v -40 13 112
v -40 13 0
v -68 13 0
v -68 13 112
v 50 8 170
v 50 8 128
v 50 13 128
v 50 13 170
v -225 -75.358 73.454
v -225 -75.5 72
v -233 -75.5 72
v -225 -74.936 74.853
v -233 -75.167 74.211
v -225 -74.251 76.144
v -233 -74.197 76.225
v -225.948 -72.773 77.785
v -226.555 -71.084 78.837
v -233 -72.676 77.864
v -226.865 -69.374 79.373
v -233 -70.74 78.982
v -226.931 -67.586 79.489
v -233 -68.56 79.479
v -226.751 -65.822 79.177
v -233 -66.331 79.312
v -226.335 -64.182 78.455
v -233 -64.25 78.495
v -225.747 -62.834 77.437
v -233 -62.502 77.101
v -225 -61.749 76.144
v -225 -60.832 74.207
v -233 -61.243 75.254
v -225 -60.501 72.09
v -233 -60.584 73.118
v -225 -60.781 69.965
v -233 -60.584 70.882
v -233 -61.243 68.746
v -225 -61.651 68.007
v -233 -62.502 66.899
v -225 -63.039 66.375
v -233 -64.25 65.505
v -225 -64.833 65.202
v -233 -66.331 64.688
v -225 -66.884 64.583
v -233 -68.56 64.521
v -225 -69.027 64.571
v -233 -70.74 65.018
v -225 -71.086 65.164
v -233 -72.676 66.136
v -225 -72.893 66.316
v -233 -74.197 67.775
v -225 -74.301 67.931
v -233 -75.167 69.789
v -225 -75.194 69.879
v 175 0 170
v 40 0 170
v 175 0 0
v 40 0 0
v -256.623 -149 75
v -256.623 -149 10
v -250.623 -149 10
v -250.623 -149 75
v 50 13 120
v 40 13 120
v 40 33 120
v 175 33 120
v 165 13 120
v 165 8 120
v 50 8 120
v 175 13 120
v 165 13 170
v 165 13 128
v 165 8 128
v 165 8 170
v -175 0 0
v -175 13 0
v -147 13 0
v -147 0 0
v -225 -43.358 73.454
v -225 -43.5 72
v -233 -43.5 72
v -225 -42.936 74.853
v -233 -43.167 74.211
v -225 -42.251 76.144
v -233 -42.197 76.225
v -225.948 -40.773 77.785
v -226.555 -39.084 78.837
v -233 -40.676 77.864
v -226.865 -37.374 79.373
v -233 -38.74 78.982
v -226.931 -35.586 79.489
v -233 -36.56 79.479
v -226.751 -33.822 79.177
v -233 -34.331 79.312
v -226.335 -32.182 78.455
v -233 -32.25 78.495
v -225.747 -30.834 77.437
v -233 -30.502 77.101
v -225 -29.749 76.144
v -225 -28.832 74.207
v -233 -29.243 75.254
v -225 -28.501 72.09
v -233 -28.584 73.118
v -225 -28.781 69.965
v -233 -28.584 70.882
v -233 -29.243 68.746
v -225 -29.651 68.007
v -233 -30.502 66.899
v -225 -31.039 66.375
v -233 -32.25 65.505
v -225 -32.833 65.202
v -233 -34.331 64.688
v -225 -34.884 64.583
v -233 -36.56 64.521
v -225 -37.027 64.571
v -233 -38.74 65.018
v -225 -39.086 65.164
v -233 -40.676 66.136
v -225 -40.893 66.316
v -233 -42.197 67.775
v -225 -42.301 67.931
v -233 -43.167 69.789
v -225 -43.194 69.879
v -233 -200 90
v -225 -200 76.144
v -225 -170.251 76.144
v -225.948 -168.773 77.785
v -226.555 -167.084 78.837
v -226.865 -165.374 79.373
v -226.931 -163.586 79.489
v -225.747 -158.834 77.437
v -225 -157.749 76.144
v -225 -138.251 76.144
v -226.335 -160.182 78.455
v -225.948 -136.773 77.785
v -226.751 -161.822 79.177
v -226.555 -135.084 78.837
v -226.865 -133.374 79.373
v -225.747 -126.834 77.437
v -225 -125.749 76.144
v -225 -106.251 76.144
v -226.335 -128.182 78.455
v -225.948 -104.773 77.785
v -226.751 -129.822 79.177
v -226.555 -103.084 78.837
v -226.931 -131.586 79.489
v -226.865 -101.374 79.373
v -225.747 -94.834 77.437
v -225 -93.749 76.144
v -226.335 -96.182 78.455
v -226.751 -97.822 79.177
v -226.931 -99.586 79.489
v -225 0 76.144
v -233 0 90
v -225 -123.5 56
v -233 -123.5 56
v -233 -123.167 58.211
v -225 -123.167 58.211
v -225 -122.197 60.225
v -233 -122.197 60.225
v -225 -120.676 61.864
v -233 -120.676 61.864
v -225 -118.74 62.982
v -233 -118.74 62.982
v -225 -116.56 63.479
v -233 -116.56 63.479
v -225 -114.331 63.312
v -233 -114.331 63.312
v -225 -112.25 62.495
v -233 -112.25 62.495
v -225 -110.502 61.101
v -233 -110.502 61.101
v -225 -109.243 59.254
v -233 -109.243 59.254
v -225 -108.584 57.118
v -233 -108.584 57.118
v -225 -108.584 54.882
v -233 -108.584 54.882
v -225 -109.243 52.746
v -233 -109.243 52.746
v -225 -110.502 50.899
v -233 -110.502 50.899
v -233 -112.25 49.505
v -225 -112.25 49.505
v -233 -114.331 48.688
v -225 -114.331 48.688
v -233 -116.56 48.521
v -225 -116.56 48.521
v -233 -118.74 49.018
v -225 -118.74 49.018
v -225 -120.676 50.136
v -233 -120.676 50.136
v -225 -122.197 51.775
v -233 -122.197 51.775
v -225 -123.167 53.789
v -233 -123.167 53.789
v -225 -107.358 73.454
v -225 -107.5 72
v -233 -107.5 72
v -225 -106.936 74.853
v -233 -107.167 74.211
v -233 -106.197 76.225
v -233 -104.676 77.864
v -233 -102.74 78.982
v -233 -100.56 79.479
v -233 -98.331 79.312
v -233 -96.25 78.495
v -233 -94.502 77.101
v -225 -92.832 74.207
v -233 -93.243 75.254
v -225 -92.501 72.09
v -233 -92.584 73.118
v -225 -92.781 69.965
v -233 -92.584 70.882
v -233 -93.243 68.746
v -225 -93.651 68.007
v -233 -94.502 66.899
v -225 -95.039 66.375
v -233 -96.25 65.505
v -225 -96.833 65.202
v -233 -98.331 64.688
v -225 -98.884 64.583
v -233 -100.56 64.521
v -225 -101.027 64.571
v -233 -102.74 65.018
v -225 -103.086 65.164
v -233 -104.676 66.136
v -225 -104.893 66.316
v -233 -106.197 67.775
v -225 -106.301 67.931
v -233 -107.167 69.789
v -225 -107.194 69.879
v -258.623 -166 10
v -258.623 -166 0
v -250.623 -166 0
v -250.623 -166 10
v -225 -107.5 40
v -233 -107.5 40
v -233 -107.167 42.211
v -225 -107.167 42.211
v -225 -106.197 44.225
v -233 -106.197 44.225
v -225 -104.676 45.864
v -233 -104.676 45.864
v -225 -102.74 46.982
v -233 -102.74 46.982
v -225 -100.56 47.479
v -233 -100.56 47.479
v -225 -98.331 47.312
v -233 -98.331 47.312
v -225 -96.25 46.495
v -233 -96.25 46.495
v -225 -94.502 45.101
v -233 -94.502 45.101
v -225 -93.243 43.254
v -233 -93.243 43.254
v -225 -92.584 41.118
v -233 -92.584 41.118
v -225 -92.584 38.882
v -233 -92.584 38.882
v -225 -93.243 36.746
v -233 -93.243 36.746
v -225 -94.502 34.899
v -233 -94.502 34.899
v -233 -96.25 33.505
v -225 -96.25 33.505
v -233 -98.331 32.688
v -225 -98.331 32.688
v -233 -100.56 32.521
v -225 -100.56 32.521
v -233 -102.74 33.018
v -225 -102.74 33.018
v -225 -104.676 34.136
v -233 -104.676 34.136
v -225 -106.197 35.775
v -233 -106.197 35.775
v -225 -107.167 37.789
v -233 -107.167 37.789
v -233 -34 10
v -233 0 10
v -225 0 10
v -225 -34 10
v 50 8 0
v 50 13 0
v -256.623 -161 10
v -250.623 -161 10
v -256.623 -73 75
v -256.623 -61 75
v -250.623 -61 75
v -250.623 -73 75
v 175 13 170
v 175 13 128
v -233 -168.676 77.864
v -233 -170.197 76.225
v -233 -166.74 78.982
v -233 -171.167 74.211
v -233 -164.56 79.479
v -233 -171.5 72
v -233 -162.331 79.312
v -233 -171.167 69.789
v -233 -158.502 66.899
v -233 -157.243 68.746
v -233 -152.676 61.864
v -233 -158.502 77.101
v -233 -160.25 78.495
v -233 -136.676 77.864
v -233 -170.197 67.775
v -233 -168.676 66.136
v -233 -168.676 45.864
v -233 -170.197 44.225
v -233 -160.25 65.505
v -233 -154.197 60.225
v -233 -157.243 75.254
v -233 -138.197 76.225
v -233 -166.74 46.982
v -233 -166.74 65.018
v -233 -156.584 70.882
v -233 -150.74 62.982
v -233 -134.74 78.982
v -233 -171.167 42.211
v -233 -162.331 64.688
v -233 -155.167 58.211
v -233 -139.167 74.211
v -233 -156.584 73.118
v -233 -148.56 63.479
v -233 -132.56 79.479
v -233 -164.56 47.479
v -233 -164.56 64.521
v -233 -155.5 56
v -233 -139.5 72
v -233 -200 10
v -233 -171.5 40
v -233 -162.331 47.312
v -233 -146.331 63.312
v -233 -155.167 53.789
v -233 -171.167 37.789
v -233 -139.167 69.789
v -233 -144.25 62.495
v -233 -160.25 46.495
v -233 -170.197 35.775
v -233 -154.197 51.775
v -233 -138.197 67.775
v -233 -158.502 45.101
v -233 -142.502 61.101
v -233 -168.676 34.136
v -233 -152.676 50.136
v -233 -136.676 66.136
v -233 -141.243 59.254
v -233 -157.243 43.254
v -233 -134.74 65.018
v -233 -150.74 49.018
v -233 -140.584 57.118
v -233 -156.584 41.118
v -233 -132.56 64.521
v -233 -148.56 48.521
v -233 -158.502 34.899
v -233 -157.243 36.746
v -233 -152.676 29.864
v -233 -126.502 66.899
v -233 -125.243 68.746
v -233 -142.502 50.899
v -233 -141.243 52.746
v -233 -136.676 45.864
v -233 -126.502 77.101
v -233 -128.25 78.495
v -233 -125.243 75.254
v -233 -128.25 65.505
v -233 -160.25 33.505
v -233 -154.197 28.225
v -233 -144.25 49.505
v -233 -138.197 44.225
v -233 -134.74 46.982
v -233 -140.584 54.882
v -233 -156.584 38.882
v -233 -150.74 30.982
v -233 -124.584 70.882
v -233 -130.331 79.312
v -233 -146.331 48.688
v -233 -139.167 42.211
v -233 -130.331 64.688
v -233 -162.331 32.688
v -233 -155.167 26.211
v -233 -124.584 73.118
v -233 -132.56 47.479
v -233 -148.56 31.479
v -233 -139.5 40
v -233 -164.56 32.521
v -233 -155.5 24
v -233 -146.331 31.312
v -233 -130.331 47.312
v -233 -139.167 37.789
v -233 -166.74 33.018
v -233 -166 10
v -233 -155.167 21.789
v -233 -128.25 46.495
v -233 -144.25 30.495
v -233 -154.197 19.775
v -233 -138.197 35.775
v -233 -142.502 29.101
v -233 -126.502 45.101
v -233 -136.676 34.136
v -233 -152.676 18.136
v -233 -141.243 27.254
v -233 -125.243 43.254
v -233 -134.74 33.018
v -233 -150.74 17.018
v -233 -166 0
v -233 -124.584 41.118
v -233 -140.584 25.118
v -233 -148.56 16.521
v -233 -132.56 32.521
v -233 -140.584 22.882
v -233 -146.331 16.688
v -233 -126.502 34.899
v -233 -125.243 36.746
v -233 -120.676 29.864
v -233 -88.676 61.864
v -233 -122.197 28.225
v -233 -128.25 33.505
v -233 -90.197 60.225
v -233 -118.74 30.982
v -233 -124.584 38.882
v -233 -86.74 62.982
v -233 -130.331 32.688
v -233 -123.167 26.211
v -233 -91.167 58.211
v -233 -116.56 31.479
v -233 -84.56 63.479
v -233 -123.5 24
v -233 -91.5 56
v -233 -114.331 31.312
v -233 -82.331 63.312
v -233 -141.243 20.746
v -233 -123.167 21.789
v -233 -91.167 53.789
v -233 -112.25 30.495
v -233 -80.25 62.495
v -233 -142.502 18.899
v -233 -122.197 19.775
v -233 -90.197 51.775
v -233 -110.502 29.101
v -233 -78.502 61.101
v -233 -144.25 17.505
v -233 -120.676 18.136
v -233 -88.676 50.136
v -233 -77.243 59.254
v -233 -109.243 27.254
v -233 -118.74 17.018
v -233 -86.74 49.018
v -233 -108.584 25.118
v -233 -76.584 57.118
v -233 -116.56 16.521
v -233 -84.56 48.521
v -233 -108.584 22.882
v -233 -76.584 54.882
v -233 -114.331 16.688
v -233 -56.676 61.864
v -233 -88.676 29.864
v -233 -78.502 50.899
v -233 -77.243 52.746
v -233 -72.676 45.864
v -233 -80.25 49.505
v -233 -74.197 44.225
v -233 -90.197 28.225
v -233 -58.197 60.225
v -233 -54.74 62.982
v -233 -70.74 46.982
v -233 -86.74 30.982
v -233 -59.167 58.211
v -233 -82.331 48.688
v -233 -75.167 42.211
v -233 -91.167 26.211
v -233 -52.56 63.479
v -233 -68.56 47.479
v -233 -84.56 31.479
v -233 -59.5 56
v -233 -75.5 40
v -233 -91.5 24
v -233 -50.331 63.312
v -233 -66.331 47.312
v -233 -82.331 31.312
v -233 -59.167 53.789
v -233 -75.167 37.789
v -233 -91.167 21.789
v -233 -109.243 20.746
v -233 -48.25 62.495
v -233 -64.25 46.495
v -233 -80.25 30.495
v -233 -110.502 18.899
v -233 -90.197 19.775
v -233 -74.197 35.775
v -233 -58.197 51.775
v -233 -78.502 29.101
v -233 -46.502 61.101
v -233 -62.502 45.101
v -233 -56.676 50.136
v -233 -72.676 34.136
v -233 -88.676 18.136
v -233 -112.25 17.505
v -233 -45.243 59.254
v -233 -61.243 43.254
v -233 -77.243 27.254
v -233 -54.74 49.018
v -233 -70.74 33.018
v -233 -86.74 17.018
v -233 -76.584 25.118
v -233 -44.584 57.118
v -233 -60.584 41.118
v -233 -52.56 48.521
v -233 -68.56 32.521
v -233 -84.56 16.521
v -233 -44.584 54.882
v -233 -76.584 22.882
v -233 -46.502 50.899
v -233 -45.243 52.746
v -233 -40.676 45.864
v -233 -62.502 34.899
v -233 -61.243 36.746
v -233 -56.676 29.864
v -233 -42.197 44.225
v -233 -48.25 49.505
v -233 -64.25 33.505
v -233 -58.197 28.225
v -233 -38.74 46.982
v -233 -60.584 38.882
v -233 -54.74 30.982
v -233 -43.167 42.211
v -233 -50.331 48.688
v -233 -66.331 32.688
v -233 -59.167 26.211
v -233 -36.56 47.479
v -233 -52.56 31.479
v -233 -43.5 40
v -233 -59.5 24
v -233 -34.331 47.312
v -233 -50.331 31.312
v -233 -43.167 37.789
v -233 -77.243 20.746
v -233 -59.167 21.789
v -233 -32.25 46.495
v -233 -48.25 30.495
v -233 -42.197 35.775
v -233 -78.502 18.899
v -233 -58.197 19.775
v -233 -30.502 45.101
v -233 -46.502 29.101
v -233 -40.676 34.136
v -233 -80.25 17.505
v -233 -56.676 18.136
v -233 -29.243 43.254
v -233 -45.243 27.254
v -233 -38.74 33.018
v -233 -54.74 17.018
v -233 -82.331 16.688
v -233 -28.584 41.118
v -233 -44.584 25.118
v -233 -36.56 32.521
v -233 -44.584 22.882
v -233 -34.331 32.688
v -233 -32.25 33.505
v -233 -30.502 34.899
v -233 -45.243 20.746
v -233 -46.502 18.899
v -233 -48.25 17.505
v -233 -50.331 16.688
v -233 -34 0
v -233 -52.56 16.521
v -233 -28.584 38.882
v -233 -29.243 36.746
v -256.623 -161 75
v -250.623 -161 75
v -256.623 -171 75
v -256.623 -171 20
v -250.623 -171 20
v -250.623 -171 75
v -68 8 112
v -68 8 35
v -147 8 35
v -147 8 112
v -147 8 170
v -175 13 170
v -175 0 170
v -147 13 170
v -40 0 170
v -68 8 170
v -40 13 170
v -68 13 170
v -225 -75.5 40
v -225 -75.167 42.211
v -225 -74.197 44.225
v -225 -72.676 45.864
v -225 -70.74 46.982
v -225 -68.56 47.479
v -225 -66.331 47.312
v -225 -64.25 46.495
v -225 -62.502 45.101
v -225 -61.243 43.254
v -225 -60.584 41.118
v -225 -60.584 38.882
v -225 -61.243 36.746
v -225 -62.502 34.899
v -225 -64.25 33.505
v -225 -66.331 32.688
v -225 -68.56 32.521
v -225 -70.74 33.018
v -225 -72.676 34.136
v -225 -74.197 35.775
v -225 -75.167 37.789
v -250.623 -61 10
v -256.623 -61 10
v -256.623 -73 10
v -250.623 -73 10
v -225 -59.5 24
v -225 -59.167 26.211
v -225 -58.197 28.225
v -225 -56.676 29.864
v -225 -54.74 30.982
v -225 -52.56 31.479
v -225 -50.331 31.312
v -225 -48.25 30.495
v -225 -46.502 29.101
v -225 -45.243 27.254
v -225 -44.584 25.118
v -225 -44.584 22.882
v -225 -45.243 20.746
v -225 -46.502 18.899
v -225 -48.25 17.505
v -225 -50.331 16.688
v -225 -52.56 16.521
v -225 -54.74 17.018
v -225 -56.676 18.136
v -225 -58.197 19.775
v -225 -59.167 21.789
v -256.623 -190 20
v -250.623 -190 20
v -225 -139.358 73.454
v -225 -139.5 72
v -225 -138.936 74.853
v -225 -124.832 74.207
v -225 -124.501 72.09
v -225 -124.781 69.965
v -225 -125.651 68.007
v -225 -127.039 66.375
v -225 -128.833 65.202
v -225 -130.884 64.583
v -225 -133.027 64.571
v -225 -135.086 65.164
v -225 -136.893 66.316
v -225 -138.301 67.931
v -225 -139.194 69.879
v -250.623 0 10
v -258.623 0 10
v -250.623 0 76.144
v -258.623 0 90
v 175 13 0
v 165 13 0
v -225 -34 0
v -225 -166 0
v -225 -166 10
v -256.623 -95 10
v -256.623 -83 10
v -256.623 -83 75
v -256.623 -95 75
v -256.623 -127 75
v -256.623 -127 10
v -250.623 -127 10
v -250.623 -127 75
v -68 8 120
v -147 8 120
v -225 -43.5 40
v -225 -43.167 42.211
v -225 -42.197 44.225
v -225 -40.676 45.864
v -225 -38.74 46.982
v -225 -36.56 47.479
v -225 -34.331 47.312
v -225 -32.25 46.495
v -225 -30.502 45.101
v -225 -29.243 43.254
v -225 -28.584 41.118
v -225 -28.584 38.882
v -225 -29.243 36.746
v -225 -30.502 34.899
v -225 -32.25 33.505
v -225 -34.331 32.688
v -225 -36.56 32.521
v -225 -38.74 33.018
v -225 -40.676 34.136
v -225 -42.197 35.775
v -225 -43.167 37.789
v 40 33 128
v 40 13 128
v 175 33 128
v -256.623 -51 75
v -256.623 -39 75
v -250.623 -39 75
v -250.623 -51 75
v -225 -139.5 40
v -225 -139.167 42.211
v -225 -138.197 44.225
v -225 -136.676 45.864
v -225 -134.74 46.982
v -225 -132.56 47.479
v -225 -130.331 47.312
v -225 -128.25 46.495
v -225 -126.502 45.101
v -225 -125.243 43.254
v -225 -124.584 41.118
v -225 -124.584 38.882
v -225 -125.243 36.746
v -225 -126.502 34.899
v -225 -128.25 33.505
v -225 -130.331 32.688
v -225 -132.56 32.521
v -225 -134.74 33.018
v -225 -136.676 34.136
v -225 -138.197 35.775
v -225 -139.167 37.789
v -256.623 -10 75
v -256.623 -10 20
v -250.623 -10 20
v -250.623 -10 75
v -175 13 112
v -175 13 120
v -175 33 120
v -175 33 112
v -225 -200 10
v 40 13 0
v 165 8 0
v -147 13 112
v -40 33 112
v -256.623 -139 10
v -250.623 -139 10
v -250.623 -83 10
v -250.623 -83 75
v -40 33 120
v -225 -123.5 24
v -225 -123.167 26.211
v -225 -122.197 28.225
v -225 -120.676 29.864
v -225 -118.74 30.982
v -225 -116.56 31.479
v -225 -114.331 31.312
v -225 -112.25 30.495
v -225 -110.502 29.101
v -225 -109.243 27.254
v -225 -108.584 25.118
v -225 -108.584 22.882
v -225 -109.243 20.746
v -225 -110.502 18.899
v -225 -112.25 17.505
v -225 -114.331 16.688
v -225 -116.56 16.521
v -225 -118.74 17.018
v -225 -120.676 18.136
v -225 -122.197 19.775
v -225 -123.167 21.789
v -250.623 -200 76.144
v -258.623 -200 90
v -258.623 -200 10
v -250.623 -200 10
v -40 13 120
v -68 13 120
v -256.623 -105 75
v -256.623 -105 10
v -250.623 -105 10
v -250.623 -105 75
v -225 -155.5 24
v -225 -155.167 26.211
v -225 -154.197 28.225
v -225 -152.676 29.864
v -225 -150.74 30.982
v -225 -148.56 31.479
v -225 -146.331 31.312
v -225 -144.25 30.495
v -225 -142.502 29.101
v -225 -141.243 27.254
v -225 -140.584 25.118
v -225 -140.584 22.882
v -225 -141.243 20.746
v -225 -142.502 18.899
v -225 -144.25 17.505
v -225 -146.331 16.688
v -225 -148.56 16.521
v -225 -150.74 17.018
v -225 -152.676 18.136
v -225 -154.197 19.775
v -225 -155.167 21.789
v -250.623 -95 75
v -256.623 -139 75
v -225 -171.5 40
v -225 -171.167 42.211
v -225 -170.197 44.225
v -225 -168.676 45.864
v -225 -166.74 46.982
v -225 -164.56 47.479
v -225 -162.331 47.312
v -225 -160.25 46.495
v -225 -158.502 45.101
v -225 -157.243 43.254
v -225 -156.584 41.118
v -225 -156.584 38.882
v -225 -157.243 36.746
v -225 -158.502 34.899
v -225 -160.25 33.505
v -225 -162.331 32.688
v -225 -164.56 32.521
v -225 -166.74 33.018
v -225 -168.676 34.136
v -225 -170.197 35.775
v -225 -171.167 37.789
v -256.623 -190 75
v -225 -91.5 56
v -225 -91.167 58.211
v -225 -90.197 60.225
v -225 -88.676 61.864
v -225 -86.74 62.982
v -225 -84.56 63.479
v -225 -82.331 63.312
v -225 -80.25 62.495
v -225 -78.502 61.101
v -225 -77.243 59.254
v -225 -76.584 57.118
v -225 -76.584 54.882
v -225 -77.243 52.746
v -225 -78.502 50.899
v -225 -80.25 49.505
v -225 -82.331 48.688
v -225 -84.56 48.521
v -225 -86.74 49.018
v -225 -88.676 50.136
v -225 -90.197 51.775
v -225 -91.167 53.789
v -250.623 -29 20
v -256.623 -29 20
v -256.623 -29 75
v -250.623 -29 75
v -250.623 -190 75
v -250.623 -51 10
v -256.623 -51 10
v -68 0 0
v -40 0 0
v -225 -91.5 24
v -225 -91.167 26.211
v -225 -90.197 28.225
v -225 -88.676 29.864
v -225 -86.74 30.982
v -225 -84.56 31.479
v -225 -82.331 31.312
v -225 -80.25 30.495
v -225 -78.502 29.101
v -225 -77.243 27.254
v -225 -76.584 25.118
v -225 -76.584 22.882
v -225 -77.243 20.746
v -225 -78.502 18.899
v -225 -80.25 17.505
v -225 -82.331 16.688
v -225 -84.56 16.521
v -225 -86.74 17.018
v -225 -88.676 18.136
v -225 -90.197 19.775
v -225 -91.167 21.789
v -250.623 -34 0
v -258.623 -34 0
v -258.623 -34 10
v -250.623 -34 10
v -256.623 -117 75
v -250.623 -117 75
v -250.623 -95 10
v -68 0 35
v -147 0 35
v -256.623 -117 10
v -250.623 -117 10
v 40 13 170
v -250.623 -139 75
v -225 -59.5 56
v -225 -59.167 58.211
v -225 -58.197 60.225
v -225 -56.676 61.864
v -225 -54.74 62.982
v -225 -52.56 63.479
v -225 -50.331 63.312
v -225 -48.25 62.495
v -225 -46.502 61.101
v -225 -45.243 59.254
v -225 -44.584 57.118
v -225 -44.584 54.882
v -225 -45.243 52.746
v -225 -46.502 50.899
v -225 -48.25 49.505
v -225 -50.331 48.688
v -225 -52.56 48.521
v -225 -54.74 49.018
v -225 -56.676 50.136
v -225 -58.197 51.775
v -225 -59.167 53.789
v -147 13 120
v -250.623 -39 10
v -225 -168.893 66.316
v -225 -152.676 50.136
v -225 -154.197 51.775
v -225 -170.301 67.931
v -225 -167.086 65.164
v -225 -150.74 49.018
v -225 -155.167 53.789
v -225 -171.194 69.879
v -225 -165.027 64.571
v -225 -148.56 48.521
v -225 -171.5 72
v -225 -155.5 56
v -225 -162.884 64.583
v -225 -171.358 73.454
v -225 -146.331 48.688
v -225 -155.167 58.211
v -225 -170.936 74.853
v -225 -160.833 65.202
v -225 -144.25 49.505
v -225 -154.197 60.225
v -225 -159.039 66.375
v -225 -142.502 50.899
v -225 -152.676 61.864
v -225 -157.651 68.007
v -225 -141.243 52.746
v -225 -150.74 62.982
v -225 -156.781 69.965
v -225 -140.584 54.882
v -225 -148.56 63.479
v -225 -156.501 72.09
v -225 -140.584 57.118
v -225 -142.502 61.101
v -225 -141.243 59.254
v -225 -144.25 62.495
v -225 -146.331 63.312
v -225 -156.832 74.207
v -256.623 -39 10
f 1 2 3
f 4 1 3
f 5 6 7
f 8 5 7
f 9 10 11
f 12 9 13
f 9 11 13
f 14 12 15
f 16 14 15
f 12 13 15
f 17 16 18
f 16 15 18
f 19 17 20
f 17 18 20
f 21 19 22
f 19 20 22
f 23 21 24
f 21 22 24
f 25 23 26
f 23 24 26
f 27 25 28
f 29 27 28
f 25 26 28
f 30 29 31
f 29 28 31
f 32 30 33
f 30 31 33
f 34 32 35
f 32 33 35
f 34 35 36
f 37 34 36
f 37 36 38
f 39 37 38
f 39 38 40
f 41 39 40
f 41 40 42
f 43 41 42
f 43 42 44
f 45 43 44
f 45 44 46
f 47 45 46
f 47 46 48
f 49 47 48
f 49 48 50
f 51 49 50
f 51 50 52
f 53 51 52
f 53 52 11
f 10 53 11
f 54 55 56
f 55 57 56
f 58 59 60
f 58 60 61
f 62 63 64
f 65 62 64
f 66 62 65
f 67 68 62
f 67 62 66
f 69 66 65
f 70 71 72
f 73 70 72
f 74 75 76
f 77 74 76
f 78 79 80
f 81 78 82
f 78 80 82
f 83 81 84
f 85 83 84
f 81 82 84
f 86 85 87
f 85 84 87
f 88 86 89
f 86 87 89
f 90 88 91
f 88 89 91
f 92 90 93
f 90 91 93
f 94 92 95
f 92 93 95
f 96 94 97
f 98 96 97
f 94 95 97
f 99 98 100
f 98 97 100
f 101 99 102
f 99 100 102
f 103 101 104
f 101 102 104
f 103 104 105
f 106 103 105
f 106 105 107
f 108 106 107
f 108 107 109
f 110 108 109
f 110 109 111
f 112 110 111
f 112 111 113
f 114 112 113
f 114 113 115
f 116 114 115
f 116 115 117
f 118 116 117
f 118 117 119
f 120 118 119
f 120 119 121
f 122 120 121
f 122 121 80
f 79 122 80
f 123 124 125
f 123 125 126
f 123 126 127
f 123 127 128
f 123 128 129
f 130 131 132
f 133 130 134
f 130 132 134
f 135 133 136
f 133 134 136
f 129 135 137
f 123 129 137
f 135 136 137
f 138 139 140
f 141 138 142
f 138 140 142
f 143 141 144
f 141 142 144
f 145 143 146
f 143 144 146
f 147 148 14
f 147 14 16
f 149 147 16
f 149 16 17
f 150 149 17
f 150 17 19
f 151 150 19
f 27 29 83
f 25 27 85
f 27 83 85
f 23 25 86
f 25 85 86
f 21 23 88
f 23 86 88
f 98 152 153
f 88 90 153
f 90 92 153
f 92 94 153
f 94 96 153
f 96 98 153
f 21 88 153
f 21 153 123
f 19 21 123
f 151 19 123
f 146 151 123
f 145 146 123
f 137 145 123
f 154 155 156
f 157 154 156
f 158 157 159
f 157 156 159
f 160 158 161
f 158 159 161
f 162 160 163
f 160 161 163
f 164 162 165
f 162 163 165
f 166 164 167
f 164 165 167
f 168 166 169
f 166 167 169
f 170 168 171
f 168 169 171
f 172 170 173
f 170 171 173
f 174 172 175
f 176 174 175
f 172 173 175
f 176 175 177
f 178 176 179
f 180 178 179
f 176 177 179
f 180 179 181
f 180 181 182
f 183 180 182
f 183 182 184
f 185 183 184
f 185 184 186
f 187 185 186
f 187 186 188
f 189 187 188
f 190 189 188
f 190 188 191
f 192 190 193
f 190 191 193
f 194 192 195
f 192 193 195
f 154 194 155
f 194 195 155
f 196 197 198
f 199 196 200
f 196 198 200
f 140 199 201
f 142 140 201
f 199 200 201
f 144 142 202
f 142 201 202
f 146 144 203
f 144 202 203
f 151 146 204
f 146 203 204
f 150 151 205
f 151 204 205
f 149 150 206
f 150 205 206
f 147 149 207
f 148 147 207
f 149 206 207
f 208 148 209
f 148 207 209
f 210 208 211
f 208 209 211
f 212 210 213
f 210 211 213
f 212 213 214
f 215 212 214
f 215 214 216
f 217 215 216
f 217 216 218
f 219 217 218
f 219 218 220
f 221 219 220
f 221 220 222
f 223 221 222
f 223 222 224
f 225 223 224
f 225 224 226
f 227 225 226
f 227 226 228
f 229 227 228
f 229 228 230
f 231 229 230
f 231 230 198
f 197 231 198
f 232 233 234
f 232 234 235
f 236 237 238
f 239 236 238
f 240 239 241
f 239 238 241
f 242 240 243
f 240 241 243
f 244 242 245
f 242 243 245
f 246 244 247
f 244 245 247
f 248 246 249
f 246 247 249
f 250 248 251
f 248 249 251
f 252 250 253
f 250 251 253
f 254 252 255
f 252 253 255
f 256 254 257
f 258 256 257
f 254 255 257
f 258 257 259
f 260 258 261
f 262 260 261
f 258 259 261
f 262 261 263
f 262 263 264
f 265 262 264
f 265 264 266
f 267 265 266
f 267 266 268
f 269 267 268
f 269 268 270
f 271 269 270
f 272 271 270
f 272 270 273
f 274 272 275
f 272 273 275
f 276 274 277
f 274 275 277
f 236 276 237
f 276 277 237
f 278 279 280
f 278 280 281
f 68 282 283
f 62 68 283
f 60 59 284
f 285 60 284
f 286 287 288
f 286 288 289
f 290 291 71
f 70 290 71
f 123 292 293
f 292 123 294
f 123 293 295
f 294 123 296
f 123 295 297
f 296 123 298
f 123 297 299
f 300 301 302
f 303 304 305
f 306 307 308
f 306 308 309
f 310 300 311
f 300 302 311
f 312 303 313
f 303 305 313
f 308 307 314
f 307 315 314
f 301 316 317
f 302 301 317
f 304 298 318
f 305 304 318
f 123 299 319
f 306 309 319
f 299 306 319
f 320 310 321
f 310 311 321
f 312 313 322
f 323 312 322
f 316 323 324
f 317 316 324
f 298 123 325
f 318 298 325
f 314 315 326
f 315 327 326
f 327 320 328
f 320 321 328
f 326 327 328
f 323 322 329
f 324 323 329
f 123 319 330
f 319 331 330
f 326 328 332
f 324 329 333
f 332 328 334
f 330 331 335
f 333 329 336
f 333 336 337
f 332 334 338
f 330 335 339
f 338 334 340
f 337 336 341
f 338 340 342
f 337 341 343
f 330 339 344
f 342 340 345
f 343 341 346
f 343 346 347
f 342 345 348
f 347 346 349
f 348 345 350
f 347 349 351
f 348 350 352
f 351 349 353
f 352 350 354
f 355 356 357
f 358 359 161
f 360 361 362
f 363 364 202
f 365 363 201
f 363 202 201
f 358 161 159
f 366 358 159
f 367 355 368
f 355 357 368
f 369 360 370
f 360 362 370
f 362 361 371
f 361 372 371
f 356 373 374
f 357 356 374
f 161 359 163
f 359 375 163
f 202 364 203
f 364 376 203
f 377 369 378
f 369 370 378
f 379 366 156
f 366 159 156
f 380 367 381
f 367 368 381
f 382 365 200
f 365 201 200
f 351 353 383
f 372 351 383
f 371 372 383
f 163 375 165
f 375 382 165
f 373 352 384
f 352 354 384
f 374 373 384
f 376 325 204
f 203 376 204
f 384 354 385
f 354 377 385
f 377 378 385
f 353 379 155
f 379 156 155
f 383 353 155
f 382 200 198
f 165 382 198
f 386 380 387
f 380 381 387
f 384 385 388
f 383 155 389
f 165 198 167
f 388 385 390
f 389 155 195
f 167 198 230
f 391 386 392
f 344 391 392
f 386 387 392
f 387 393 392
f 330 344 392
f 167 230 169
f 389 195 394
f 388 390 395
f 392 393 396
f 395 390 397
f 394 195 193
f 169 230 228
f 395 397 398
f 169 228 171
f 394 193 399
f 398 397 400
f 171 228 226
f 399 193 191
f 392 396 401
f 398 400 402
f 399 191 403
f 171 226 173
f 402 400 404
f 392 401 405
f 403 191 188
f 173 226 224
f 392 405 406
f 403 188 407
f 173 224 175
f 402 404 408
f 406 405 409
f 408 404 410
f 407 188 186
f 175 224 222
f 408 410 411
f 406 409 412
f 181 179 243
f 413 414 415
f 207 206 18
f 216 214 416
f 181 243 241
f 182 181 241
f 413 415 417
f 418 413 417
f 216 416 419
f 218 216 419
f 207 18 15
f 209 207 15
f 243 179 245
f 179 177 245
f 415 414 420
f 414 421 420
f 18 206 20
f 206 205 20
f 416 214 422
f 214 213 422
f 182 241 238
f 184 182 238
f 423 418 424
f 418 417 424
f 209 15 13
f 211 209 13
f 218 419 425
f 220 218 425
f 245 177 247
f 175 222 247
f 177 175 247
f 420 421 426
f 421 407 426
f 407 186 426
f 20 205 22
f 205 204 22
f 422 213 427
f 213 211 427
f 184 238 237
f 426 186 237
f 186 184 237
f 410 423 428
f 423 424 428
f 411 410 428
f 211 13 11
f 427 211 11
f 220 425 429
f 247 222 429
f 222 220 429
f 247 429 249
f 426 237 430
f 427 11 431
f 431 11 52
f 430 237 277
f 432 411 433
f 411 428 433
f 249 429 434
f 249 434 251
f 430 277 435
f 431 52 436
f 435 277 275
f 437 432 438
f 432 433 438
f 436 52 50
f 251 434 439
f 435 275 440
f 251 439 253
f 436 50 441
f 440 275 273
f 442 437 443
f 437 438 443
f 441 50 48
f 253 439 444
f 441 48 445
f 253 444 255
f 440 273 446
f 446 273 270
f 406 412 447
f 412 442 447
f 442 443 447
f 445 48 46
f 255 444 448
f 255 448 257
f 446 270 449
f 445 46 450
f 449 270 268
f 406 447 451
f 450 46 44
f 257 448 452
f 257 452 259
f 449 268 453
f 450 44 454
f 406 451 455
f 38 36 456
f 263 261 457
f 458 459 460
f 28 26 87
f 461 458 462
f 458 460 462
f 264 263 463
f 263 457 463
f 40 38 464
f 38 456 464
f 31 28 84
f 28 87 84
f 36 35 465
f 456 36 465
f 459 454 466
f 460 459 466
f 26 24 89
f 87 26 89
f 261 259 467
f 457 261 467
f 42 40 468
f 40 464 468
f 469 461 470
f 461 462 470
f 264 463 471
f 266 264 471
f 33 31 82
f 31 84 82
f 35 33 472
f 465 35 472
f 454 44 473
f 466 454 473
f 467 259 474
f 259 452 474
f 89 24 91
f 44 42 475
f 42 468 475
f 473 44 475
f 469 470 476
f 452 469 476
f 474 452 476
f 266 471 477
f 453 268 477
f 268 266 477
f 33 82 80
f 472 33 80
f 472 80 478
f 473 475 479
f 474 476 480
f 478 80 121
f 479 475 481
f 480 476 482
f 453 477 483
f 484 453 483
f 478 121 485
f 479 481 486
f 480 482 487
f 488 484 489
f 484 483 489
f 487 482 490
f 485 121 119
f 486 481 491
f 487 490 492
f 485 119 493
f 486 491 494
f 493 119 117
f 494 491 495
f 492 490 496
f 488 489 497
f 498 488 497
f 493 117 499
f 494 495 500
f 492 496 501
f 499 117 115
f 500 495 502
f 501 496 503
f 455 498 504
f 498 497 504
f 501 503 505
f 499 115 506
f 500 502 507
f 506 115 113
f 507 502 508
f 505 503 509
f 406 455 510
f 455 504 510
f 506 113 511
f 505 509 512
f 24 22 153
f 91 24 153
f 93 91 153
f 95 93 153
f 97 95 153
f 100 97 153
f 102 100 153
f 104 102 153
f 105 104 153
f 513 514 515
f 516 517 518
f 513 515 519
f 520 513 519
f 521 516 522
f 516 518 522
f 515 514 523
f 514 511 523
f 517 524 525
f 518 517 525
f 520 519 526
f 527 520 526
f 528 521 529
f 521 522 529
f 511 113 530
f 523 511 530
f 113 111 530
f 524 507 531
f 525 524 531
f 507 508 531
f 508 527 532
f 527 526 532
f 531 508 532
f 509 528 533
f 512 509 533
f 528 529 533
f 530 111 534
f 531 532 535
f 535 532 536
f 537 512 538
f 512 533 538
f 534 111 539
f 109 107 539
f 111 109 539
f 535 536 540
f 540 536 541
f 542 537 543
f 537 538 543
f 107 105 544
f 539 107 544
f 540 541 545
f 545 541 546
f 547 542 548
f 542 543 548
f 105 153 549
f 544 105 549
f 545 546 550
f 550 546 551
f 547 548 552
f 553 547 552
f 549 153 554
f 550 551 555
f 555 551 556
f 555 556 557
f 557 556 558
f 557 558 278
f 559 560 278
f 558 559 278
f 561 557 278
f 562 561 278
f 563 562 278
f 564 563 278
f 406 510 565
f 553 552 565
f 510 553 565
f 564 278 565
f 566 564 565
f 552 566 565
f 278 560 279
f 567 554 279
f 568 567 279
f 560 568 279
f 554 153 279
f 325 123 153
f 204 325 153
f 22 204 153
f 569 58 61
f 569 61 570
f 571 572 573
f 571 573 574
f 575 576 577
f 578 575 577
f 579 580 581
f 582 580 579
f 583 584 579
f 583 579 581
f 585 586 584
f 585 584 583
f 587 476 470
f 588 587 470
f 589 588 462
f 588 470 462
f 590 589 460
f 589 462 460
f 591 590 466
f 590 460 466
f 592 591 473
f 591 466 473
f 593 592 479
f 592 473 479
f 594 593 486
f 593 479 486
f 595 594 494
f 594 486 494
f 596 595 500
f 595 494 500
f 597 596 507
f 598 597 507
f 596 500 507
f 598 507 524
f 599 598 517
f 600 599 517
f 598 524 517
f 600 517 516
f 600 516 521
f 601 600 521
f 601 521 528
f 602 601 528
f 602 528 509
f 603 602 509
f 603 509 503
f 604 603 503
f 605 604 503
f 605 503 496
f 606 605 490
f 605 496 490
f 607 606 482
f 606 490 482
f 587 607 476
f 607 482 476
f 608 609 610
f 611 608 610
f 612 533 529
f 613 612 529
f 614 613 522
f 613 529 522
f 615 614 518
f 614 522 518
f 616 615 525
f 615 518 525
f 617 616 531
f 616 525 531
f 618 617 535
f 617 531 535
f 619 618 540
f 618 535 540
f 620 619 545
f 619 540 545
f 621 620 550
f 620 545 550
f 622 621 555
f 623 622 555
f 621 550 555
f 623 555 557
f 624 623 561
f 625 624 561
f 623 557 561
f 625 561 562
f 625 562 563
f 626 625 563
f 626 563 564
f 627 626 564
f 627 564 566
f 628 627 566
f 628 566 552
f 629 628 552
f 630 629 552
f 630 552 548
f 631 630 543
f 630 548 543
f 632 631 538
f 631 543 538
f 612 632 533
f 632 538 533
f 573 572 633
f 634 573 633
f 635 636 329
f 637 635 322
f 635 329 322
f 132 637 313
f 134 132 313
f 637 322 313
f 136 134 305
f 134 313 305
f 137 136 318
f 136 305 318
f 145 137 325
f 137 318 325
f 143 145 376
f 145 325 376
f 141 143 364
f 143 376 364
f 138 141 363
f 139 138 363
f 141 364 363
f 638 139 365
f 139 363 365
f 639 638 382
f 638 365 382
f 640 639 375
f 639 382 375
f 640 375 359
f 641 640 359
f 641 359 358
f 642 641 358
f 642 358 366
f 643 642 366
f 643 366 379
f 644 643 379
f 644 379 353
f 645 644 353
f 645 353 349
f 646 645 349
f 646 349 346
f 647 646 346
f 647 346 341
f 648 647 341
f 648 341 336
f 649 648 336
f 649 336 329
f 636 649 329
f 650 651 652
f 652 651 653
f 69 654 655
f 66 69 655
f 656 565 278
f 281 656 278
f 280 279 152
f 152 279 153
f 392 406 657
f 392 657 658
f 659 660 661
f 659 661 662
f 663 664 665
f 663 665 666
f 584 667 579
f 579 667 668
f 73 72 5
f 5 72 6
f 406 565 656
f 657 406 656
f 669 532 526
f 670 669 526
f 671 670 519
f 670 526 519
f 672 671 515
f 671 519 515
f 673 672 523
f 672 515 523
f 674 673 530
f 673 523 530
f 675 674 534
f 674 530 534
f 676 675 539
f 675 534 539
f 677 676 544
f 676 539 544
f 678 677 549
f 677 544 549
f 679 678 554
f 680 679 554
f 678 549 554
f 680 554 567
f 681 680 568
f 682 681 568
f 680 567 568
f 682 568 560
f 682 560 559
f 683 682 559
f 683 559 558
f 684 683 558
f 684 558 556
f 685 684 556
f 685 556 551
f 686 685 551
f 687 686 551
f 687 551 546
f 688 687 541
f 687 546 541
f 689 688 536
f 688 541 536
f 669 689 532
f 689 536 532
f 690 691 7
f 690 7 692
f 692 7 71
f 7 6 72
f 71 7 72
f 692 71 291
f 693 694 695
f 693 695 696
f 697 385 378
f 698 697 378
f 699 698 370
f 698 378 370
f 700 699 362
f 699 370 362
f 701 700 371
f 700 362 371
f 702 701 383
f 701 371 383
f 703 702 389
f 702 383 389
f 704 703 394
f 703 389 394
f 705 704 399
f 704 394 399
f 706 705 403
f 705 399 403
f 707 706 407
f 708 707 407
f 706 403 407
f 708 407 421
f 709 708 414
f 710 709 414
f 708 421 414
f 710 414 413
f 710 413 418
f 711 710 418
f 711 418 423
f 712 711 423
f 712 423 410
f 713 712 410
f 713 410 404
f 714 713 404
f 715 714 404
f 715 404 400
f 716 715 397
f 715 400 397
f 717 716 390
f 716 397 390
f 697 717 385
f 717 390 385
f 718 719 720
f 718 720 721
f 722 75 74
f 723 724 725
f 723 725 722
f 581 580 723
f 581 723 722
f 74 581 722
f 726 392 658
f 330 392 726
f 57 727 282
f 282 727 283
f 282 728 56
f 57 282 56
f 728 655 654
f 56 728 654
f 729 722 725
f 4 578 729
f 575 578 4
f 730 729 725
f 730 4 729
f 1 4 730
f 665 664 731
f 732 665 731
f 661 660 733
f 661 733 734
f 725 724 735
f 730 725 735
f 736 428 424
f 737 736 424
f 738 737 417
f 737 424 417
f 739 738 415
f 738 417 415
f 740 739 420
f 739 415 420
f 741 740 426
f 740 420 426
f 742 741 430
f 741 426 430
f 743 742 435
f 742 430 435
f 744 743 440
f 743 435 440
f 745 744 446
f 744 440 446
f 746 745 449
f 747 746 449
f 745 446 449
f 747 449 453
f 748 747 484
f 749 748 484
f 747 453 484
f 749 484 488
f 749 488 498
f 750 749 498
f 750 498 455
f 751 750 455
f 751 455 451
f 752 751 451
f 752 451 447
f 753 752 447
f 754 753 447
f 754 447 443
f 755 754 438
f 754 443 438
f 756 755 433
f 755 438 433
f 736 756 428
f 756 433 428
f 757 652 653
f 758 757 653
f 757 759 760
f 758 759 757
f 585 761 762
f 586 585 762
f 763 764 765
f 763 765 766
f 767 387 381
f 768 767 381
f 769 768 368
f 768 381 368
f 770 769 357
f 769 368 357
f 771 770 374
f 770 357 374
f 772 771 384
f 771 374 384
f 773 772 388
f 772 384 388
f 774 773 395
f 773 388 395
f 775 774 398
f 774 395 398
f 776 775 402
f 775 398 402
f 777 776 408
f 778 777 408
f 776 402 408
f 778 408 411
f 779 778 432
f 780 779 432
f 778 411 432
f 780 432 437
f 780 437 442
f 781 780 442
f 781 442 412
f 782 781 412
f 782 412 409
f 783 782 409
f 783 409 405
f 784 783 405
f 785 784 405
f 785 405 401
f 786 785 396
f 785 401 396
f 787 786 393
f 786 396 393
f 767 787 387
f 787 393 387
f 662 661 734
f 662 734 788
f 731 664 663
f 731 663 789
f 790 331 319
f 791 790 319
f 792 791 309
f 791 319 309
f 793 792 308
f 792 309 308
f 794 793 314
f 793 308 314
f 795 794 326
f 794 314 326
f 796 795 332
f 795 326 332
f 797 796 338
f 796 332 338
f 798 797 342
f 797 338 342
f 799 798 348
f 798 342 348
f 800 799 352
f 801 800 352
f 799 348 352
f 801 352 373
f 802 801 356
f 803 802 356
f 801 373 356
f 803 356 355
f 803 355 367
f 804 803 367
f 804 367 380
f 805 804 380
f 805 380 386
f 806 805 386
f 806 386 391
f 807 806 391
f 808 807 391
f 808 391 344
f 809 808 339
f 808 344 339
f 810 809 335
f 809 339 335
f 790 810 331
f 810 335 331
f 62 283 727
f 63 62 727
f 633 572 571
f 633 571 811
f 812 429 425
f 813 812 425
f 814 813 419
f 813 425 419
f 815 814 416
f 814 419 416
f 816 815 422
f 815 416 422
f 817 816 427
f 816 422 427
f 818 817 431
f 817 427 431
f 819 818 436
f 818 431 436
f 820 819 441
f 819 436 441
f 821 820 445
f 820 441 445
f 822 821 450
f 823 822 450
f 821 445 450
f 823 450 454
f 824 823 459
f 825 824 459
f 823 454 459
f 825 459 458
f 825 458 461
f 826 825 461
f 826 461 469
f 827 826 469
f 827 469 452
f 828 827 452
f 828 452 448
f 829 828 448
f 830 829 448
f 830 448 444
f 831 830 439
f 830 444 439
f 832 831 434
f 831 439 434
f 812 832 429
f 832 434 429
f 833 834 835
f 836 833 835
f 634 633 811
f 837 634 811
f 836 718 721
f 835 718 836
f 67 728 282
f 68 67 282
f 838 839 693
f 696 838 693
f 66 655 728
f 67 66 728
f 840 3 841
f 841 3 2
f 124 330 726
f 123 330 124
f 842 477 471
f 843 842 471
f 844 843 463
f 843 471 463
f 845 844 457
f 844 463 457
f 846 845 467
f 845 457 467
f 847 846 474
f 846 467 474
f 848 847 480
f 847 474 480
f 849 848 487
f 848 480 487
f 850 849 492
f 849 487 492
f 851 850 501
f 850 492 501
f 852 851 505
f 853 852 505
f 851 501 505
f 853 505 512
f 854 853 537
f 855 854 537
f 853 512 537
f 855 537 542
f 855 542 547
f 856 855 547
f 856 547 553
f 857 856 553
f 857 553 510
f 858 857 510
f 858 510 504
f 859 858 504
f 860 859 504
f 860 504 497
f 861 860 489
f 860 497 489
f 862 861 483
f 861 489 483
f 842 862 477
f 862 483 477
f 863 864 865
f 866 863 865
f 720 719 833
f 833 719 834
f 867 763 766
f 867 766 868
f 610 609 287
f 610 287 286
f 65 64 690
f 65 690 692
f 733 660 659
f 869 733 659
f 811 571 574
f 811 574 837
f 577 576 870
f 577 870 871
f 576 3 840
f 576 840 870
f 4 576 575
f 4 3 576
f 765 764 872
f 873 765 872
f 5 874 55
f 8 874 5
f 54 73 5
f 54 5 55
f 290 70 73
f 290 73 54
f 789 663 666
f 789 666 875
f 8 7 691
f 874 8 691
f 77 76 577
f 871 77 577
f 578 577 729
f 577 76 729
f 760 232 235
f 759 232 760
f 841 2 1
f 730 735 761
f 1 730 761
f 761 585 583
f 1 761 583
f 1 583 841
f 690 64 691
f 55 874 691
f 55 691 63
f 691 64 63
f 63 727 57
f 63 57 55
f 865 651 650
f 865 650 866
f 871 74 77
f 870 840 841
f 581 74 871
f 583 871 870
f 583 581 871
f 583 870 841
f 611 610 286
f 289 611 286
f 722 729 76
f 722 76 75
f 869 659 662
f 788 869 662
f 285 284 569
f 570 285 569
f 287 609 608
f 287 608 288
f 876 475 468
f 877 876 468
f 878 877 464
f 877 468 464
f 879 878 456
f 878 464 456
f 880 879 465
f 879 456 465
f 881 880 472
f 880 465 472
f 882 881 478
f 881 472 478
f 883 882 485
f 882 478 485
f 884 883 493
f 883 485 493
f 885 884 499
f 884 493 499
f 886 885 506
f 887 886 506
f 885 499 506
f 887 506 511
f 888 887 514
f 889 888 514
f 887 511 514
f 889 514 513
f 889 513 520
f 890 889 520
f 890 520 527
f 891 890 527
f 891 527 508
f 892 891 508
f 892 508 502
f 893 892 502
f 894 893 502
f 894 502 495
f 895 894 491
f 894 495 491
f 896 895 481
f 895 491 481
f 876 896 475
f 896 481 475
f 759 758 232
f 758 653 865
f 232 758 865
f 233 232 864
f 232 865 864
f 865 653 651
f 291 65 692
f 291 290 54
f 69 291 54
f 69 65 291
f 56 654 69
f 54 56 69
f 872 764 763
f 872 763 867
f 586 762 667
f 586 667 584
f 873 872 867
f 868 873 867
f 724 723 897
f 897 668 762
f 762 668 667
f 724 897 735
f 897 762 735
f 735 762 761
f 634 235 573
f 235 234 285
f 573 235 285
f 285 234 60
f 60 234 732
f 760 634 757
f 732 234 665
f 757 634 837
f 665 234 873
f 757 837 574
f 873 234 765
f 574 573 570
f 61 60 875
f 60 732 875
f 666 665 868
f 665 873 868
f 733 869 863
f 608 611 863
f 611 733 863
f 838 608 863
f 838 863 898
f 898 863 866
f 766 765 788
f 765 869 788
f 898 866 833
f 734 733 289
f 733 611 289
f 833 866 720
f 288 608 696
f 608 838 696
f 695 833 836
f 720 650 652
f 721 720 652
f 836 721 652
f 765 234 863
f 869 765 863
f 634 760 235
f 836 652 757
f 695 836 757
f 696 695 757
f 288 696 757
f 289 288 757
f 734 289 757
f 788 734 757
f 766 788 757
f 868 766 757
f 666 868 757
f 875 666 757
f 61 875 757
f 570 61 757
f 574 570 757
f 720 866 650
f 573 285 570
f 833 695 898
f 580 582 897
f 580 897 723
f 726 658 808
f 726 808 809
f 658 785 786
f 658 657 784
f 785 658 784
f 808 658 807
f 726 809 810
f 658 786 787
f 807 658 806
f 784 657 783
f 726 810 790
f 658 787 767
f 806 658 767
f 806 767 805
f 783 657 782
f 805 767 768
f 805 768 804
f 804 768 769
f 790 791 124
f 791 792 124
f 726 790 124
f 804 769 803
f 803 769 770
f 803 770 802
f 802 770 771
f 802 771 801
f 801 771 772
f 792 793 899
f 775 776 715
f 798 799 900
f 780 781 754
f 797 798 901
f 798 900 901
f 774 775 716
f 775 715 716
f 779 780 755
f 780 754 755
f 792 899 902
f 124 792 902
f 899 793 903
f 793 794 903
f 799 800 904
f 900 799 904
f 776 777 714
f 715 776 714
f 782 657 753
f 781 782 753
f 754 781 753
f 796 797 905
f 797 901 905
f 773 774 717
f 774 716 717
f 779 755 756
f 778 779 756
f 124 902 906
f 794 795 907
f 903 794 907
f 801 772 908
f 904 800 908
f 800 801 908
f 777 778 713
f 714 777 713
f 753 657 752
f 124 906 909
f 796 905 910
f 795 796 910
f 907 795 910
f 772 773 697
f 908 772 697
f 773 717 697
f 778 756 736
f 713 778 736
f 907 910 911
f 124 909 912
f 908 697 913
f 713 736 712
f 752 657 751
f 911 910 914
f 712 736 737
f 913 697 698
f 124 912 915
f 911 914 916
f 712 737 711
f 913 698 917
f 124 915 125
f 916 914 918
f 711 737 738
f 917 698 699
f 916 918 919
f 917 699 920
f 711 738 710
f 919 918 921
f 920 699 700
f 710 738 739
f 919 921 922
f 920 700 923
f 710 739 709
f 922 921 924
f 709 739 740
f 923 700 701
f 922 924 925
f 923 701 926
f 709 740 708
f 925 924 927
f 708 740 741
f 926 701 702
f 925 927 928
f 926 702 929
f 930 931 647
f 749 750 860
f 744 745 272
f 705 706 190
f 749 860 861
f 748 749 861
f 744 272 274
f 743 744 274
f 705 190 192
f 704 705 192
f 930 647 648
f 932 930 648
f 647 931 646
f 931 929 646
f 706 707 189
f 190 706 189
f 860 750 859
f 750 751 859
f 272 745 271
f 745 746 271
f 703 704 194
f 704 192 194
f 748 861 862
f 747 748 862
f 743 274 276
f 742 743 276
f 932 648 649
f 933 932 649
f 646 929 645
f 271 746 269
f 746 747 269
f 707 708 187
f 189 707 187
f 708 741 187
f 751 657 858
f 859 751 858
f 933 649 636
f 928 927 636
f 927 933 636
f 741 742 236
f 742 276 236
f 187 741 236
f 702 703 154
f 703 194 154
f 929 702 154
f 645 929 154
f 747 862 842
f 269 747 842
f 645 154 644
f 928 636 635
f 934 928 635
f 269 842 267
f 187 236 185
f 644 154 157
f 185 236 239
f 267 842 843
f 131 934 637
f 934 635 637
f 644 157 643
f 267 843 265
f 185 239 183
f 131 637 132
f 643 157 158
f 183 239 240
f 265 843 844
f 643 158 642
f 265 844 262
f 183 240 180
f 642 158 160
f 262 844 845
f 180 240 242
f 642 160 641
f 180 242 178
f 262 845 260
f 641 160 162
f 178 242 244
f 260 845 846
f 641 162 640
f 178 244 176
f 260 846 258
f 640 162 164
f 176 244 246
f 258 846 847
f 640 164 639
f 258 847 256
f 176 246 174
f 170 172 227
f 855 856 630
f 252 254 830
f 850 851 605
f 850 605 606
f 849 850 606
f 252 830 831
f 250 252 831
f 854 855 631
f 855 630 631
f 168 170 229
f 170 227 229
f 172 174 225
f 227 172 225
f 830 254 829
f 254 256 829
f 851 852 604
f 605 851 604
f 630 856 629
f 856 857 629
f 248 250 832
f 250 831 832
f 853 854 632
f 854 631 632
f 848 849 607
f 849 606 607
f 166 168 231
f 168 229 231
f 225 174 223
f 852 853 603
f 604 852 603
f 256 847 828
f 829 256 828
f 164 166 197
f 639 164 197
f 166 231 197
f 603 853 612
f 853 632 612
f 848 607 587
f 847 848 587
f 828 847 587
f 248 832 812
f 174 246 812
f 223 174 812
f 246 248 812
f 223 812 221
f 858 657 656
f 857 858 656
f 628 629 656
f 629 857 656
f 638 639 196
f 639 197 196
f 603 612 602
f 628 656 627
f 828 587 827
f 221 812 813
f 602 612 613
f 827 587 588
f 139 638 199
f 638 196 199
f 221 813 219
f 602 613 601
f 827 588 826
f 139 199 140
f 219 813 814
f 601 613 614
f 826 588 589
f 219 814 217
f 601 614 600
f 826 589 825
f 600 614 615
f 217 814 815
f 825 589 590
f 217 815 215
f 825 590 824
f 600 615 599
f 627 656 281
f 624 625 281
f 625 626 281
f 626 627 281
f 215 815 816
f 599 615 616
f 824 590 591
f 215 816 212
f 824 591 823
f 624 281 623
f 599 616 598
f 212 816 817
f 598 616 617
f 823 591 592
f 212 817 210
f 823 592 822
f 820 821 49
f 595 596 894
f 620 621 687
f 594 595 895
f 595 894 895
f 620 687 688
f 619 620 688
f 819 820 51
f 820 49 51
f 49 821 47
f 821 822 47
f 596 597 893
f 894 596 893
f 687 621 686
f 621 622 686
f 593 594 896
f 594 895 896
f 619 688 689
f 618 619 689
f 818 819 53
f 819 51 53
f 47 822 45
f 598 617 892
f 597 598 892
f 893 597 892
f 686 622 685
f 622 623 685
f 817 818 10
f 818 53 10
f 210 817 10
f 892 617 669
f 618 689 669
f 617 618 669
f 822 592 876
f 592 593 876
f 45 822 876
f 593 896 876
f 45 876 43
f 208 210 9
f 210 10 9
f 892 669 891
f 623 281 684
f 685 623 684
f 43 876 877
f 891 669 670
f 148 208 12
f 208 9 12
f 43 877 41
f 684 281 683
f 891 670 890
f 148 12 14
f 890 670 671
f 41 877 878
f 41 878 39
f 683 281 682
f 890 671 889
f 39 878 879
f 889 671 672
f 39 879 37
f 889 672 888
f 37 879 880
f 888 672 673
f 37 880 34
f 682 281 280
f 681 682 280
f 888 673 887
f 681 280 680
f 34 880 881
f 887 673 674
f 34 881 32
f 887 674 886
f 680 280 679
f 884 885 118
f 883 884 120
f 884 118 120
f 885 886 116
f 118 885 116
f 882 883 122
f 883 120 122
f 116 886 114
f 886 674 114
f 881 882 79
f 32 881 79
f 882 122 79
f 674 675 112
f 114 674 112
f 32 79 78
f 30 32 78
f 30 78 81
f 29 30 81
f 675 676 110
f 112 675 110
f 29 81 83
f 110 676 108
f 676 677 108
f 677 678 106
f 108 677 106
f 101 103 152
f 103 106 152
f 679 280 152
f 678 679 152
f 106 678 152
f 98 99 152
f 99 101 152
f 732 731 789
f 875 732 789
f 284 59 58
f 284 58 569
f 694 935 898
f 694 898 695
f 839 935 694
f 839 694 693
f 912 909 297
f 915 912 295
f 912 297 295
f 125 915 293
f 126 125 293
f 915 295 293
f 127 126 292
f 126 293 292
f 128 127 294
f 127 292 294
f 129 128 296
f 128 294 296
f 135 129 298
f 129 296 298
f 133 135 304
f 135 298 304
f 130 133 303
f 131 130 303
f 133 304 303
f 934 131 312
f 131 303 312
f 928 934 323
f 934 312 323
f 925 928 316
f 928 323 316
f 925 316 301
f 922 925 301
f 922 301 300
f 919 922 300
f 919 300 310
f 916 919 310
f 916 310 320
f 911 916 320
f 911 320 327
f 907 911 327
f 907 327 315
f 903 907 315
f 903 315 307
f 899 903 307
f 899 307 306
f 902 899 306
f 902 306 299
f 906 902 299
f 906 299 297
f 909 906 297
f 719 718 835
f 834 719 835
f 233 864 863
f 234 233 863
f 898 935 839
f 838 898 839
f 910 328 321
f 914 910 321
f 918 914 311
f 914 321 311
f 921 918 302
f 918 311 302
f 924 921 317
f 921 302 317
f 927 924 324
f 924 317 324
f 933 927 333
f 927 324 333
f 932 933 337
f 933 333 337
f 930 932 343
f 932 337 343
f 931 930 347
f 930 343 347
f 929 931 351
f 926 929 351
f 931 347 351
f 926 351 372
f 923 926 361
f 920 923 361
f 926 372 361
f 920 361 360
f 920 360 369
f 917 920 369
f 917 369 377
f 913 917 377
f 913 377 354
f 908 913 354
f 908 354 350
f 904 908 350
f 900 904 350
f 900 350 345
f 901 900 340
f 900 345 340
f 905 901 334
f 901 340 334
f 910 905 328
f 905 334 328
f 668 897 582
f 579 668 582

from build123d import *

# Parameters (mm, degrees)
F1_DEPTH  = 170
F3_W      = 135
F3_H      = 33
F4_DEPTH  = 8
F6_DEPTH  = 170
F7_W      = 79
F7_H      = 35
F8_DEPTH  = 8
F9_W      = 135
F9_H      = 33
F10_DEPTH = 8
F12_DEPTH = 200
F13_W     = 34
F13_H     = 10
F13_R     = 7.5
F14_DEPTH = 8
F16_DEPTH = 200
F17_W     = 34
F17_H     = 10
F18_DEPTH = 8
F20_W     = 19
F20_H     = 55
F20_W_2   = 12
F20_H_2   = 65
F21_DEPTH = 6


with BuildPart() as f1:
    # F0 (on Top) → F1 (new body)
    with BuildSketch(Plane.XY):
        Polygon((50, 13), (40, 13), (40, 0), (175, 0), (175, 13), (165, 13), (165, 8), (50, 8), align=None)
    extrude(amount=F1_DEPTH)

    # F3 (on offset) → F4 (join)
    with BuildSketch(Plane(origin=(0, 0, 120), x_dir=(1, 0, 0), z_dir=(0, 0, -1))):
        with Locations((107.5, -16.5)):
            Rectangle(F3_W, F3_H)
    extrude(amount=-F4_DEPTH)


with BuildPart() as f6:
    # F5 (on Top) → F6 (new body)
    with BuildSketch(Plane.XY):
        Polygon((-175, 0), (-40, 0), (-40, 13), (-68, 13), (-68, 8), (-147, 8), (-147, 13), (-175, 13), align=None)
    extrude(amount=F6_DEPTH)

    # F7 (on face) → F8 (cut, through all)
    with BuildSketch(Plane(origin=(0, 8, 0), x_dir=(-1, 0, 0), z_dir=(0, 1, 0))):
        with Locations((107.5, 17.5)):
            Rectangle(F7_W, F7_H)
    extrude(amount=-F8_DEPTH, mode=Mode.SUBTRACT)

    # F9 (on offset) → F10 (join)
    with BuildSketch(Plane(origin=(0, 0, 120), x_dir=(1, 0, 0), z_dir=(0, 0, -1))):
        with Locations((-107.5, -16.5)):
            Rectangle(F9_W, F9_H)
    extrude(amount=F10_DEPTH)


with BuildPart() as f12:
    # F11 (on Front) → F12 (new body)
    with BuildSketch(Plane.XZ):
        Polygon((-233, 0), (-225, 0), (-225, 76.1435935394), (-233, 90), align=None)
    extrude(amount=F12_DEPTH)

    # F13 (on face) → F14 (cut, through all)
    with BuildSketch(Plane(origin=(-233, 0, 0), x_dir=(0, -1, 0), z_dir=(-1, 0, 0))):
        with Locations((17, 5)):
            Rectangle(F13_W, F13_H)
        with Locations((183, 5)):
            Rectangle(F13_W, F13_H)
        with Locations((36, 72)):
            Circle(F13_R)
        with Locations((52, 56)):
            Circle(F13_R)
        with Locations((36, 40)):
            Circle(F13_R)
        with Locations((52, 24)):
            Circle(F13_R)
        with Locations((68, 72)):
            Circle(F13_R)
        with Locations((84, 56)):
            Circle(F13_R)
        with Locations((68, 40)):
            Circle(F13_R)
        with Locations((84, 24)):
            Circle(F13_R)
        with Locations((100, 72)):
            Circle(F13_R)
        with Locations((116, 56)):
            Circle(F13_R)
        with Locations((100, 40)):
            Circle(F13_R)
        with Locations((116, 24)):
            Circle(F13_R)
        with Locations((132, 72)):
            Circle(F13_R)
        with Locations((148, 56)):
            Circle(F13_R)
        with Locations((132, 40)):
            Circle(F13_R)
        with Locations((148, 24)):
            Circle(F13_R)
        with Locations((164, 72)):
            Circle(F13_R)
        with Locations((164, 40)):
            Circle(F13_R)
    extrude(amount=-F14_DEPTH, mode=Mode.SUBTRACT)


with BuildPart() as f16:
    # F15 (on Front) → F16 (new body)
    with BuildSketch(Plane.XZ):
        Polygon((-258.6232423782, 0), (-250.6232423782, 0), (-250.6232423782, 76.1435935394), (-258.6232423782, 90), align=None)
    extrude(amount=F16_DEPTH)

    # F17 (on face) → F18 (cut, through all)
    with BuildSketch(Plane(origin=(-258.6232423782, 0, 0), x_dir=(0, -1, 0), z_dir=(-1, 0, 0))):
        with Locations((17, 5)):
            Rectangle(F17_W, F17_H)
        with Locations((183, 5)):
            Rectangle(F17_W, F17_H)
    extrude(amount=-F18_DEPTH, mode=Mode.SUBTRACT)

    # F20 (on offset) → F21 (cut, through all)
    with BuildSketch(Plane(origin=(-256.6232423782, 0, 0), x_dir=(0, -1, 0), z_dir=(-1, 0, 0))):
        with Locations((19.5, 47.5)):
            Rectangle(F20_W, F20_H)
        with Locations((45, 42.5)):
            Rectangle(F20_W_2, F20_H_2)
        with Locations((67, 42.5)):
            Rectangle(F20_W_2, F20_H_2)
        with Locations((89, 42.5)):
            Rectangle(F20_W_2, F20_H_2)
        with Locations((111, 42.5)):
            Rectangle(F20_W_2, F20_H_2)
        with Locations((133, 42.5)):
            Rectangle(F20_W_2, F20_H_2)
        with Locations((155, 42.5)):
            Rectangle(F20_W_2, F20_H_2)
        with Locations((180.5, 47.5)):
            Rectangle(F20_W, F20_H)
    extrude(amount=-F21_DEPTH, mode=Mode.SUBTRACT)


solid = Compound([f1.part, f6.part, f12.part, f16.part])
